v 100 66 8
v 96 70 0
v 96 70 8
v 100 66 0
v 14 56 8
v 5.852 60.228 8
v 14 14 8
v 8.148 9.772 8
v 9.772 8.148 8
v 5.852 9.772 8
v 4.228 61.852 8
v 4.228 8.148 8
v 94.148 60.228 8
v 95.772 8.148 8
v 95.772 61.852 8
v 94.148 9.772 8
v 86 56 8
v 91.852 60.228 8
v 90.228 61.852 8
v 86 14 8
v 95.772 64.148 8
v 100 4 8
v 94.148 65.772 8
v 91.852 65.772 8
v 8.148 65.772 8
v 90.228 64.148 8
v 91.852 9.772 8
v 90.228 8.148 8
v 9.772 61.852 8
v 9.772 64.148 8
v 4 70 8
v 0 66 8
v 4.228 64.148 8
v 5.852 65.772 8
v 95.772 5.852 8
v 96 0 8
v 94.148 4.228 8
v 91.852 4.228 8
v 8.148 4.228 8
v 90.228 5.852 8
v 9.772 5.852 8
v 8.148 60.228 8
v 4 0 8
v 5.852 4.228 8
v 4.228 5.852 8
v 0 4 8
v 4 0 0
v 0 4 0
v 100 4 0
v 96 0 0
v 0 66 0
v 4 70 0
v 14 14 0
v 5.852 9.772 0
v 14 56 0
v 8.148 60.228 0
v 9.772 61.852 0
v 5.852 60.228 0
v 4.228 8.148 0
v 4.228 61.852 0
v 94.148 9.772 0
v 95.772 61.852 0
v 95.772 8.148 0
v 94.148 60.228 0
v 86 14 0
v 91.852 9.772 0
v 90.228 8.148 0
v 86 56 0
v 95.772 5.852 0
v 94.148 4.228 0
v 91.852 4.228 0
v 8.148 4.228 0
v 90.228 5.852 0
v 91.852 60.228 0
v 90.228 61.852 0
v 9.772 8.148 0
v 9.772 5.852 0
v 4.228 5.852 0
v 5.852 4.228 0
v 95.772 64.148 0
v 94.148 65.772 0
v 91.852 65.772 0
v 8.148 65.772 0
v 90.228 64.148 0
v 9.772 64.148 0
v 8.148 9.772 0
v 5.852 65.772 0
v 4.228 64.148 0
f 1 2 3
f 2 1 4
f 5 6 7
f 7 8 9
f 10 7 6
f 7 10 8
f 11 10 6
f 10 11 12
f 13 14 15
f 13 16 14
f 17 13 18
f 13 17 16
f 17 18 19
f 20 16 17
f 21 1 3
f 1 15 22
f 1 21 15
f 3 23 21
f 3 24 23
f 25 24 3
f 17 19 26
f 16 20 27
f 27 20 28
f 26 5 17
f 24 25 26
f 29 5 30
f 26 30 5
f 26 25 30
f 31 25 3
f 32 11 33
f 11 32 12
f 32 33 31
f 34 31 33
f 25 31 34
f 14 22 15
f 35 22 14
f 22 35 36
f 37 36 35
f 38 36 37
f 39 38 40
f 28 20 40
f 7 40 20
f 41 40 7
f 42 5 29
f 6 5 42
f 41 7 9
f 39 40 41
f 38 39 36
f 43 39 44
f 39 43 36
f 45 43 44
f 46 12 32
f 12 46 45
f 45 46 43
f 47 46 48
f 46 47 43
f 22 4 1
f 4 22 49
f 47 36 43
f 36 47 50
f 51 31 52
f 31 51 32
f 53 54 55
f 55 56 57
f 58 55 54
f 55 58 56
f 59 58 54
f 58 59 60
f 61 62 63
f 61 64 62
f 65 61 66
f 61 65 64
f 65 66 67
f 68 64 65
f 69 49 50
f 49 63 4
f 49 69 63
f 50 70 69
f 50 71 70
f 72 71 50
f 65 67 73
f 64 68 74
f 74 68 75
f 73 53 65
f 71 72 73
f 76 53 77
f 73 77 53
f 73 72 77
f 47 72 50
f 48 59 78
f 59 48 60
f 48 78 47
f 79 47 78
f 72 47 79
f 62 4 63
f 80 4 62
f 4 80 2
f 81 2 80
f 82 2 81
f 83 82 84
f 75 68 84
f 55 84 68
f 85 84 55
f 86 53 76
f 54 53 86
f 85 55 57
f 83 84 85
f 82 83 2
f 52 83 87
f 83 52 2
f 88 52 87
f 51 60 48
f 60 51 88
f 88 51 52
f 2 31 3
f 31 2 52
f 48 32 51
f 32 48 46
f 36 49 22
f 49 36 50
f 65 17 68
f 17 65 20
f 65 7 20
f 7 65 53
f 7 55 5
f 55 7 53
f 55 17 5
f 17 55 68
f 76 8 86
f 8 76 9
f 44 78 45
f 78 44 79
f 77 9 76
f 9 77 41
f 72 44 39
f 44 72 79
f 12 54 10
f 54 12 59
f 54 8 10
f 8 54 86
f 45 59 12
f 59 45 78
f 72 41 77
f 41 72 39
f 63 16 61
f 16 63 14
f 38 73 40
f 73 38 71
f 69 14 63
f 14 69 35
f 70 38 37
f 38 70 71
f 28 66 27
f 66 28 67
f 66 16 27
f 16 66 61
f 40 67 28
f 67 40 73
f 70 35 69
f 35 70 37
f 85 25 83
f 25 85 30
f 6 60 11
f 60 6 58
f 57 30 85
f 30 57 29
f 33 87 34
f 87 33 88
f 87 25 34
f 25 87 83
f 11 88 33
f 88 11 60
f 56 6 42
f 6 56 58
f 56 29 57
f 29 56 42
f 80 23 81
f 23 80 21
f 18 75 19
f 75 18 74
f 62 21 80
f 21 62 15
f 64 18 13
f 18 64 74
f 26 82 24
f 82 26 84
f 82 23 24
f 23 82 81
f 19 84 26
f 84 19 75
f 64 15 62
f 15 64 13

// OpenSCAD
$fn = 32;

// ----------------------------------------------------------------------
// Frame plate: 100 x 70 frame, 14 mm rails
// ----------------------------------------------------------------------

// --- parameters (mm) ---
plate_l = 100;            // plate length, X
plate_w = 70;             // plate width, Y
plate_t = 8;              // plate thickness, Z (extrusion height)
corner_c = 4;             // corner chamfer
frame_bar = 14;           // frame rail width
bolt_r = 3;               // corner bolt window radius
bolt_inset = 7;           // bolt centre inset from the edges

win_l = plate_l - 2 * frame_bar;  // window length
win_w = plate_w - 2 * frame_bar;  // window width
bolt_d = 2 * bolt_r;  // corner hole diameter

profile = [[4, 0], [96, 0], [100, 4], [100, 66], [96, 70], [4, 70], [0, 66], [0, 4]];  // primary outline, 8 points, counter clockwise
void_1 = [[14, 14], [86, 14], [86, 56], [14, 56]];  // the window, 4 points
void_2 = [[9.772, 8.148], [8.148, 9.772], [5.852, 9.772], [4.228, 8.148], [4.228, 5.852], [5.852, 4.228], [8.148, 4.228], [9.772, 5.852]];  // corner bolt window, 8 points
void_3 = [[95.772, 8.148], [94.148, 9.772], [91.852, 9.772], [90.228, 8.148], [90.228, 5.852], [91.852, 4.228], [94.148, 4.228], [95.772, 5.852]];  // corner bolt window, 8 points
void_4 = [[9.772, 64.148], [8.148, 65.772], [5.852, 65.772], [4.228, 64.148], [4.228, 61.852], [5.852, 60.228], [8.148, 60.228], [9.772, 61.852]];  // corner bolt window, 8 points
void_5 = [[95.772, 64.148], [94.148, 65.772], [91.852, 65.772], [90.228, 64.148], [90.228, 61.852], [91.852, 60.228], [94.148, 60.228], [95.772, 61.852]];  // corner bolt window, 8 points

// --- the one profile operation ---
difference() {
  linear_extrude(height = plate_t) polygon(points = profile);
  translate([0, 0, -1])
    linear_extrude(height = plate_t + 2) polygon(points = void_1);
  translate([0, 0, -1])
    linear_extrude(height = plate_t + 2) polygon(points = void_2);
  translate([0, 0, -1])
    linear_extrude(height = plate_t + 2) polygon(points = void_3);
  translate([0, 0, -1])
    linear_extrude(height = plate_t + 2) polygon(points = void_4);
  translate([0, 0, -1])
    linear_extrude(height = plate_t + 2) polygon(points = void_5);
}
